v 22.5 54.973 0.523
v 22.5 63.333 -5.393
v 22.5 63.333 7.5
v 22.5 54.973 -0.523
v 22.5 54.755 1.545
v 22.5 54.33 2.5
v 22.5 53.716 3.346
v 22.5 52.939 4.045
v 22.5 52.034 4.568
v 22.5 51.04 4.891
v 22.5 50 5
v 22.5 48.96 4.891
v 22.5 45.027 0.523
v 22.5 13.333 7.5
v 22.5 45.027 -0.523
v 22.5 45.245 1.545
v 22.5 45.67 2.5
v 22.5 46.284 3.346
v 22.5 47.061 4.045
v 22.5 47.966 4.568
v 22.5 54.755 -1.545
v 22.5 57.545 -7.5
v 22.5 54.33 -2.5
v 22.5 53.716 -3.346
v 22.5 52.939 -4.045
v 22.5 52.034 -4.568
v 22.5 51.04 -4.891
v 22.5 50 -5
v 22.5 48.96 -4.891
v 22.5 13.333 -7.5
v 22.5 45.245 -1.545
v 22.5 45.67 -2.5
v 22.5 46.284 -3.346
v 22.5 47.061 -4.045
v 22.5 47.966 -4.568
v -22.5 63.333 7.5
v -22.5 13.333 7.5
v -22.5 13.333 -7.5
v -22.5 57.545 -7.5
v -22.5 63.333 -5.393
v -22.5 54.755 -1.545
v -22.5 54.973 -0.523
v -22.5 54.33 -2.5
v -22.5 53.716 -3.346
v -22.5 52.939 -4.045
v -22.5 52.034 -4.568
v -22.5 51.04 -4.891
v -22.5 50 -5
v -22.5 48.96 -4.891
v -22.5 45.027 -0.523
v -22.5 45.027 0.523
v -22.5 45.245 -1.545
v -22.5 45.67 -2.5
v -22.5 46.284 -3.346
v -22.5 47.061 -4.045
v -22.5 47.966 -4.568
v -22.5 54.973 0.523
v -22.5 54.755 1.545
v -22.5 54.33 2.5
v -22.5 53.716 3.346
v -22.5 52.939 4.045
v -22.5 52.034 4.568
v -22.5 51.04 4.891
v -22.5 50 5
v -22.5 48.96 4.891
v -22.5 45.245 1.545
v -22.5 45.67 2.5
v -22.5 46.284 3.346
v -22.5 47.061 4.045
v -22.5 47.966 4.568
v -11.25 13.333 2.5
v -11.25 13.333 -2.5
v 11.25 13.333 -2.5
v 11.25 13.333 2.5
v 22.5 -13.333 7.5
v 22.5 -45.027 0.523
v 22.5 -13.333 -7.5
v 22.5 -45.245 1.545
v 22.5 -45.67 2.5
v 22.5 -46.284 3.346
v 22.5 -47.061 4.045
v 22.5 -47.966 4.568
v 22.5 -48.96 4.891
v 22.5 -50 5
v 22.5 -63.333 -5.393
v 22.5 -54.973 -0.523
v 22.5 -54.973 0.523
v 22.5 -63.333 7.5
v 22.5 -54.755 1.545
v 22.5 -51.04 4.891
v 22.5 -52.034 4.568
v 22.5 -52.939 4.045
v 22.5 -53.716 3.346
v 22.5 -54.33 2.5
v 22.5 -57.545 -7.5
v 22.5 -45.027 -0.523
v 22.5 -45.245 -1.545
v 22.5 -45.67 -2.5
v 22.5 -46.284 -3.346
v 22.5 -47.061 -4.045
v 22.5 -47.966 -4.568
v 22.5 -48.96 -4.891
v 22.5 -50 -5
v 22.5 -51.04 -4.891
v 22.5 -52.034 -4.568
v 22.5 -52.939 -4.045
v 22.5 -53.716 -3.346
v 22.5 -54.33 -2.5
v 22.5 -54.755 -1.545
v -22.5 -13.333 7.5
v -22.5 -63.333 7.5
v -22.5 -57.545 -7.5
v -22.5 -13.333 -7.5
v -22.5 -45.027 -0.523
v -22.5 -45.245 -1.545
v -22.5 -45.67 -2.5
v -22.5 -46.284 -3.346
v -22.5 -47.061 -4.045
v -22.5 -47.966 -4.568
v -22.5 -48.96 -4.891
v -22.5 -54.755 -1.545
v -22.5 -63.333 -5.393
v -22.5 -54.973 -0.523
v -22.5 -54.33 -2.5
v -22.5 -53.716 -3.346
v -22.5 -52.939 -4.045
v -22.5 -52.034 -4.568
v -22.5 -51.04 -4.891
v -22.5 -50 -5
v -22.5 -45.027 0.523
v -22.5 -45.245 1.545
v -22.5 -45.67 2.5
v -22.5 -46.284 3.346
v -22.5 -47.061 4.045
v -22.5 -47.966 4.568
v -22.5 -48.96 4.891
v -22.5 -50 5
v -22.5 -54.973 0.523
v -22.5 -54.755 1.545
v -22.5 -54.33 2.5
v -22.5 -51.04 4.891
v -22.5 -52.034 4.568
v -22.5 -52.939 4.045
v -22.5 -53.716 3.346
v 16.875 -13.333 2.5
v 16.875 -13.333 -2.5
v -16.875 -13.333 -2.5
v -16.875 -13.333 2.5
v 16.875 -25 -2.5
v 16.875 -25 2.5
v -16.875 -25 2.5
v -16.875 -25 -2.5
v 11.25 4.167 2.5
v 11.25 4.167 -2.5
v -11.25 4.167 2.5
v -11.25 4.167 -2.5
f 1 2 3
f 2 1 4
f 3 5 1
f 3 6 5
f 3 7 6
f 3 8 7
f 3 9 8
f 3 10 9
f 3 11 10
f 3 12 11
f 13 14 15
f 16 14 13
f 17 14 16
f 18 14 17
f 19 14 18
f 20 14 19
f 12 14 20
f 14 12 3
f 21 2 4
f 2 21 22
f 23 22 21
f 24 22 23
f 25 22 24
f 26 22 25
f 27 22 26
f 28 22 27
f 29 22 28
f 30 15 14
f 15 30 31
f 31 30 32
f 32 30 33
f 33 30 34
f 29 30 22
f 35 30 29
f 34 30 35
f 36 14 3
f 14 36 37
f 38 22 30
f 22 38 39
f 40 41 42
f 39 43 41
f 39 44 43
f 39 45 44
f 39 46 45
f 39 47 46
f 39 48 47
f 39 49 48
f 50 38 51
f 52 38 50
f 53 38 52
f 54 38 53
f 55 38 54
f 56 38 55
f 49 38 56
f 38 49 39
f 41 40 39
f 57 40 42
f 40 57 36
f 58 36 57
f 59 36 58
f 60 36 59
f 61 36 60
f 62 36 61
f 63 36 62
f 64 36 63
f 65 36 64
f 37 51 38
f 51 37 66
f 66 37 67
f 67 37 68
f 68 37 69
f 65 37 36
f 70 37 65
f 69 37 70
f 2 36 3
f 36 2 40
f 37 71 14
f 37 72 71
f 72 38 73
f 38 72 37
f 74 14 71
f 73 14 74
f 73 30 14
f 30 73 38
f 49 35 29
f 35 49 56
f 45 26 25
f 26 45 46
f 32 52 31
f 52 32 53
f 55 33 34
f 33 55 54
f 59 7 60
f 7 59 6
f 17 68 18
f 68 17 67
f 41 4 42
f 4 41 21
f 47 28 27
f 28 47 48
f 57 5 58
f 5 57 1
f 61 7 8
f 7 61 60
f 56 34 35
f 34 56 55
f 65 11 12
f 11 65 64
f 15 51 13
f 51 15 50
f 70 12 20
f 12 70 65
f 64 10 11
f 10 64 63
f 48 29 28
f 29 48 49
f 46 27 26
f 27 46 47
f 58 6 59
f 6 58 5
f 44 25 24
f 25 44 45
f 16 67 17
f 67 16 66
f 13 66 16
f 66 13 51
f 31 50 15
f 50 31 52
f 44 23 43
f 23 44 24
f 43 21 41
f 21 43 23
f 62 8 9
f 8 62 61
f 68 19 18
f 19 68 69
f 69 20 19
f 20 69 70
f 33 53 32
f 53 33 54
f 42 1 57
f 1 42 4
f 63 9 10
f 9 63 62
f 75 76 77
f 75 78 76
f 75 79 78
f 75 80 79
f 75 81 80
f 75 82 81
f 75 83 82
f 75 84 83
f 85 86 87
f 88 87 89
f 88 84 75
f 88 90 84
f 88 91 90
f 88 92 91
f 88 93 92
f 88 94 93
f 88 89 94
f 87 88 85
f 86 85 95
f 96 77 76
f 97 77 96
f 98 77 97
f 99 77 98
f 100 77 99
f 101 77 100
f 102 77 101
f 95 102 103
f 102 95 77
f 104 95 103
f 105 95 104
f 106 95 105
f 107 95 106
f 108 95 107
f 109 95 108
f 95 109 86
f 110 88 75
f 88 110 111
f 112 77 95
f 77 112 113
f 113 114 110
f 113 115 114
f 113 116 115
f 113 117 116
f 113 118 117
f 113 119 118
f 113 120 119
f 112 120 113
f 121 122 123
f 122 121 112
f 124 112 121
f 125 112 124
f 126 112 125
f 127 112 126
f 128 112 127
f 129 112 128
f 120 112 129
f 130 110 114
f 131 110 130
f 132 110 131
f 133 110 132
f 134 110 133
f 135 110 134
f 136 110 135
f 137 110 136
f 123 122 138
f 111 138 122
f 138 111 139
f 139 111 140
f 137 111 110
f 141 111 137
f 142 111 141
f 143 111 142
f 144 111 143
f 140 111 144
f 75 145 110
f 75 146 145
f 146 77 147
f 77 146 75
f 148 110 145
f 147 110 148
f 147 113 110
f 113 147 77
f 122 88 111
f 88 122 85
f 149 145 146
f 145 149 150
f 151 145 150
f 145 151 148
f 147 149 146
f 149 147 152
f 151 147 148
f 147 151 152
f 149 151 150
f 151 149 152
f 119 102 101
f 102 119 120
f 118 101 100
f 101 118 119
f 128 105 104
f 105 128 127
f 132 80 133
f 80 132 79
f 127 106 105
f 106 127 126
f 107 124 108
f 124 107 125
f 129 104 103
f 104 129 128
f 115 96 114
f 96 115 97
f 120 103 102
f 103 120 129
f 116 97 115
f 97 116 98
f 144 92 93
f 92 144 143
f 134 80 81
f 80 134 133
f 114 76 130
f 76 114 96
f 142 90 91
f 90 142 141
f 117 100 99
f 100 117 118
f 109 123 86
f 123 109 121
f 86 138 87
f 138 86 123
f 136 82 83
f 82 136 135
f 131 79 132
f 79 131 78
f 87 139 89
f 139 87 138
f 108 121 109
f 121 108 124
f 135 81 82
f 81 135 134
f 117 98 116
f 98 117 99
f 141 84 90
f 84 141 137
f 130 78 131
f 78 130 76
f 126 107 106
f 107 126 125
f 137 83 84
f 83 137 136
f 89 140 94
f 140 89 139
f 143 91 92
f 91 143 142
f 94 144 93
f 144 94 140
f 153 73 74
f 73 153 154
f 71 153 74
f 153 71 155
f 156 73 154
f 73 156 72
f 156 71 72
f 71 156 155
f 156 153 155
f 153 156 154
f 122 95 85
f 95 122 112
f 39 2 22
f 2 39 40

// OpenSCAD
$fs = 0.01;


laser_length=30;
laser_diam=10;

laser_offset=100; // 10 cm
block_length=laser_offset/2;
block_width=laser_length*1.5;
block_height=laser_diam*1.5;

laser_hole_length=block_width*1.1;

tongue_length=block_length/3;
tongue_width=block_width*.5;
tongue_height=block_height/3;

block_translate_along_length=tongue_length*.8;

tongue_translate_along_length=tongue_length/2;

bevel_width=block_width*1.2;
bevel_length=10;
bevel_height=10;

difference() {
union() {
difference() {
// big block
translate([-block_width/2,block_translate_along_length,-block_height/2])
cube(size=[block_width,block_length,block_height]);

translate([-laser_hole_length/2,50,])
rotate([0,90,0])
 cylinder(h=laser_hole_length, r1=laser_diam/2, r2=laser_diam/2);
}

// tongue
translate([-tongue_width/2,tongue_translate_along_length/2,-tongue_height/2])
cube(size=[tongue_width,tongue_length,tongue_height]);


difference() {
// big block
    
    difference() {
translate([-block_width/2,-(block_translate_along_length+block_length),-block_height/2])
cube(size=[block_width,block_length,block_height]);

// anti-tongue
        
       translate([-tongue_width*1.5/2,-tongue_length*1.5,-tongue_height/2])
cube(size=[tongue_width*1.5,tongue_length,tongue_height]); 
        
    }
    
    
translate([-laser_hole_length/2,-50,])
rotate([0,90,0])
 cylinder(h=laser_hole_length, r1=laser_diam/2, r2=laser_diam/2);
}

}

union() {
translate([0,-(block_translate_along_length+block_length),-block_height/1.4])
rotate([-20,0,0])
cube (size = [bevel_width,bevel_length,bevel_height], center=true);

translate([0,block_translate_along_length+block_length,-block_height/1.4])
rotate([20,0,0])
cube (size = [bevel_width,bevel_length,bevel_height], center=true);
    
}

}
